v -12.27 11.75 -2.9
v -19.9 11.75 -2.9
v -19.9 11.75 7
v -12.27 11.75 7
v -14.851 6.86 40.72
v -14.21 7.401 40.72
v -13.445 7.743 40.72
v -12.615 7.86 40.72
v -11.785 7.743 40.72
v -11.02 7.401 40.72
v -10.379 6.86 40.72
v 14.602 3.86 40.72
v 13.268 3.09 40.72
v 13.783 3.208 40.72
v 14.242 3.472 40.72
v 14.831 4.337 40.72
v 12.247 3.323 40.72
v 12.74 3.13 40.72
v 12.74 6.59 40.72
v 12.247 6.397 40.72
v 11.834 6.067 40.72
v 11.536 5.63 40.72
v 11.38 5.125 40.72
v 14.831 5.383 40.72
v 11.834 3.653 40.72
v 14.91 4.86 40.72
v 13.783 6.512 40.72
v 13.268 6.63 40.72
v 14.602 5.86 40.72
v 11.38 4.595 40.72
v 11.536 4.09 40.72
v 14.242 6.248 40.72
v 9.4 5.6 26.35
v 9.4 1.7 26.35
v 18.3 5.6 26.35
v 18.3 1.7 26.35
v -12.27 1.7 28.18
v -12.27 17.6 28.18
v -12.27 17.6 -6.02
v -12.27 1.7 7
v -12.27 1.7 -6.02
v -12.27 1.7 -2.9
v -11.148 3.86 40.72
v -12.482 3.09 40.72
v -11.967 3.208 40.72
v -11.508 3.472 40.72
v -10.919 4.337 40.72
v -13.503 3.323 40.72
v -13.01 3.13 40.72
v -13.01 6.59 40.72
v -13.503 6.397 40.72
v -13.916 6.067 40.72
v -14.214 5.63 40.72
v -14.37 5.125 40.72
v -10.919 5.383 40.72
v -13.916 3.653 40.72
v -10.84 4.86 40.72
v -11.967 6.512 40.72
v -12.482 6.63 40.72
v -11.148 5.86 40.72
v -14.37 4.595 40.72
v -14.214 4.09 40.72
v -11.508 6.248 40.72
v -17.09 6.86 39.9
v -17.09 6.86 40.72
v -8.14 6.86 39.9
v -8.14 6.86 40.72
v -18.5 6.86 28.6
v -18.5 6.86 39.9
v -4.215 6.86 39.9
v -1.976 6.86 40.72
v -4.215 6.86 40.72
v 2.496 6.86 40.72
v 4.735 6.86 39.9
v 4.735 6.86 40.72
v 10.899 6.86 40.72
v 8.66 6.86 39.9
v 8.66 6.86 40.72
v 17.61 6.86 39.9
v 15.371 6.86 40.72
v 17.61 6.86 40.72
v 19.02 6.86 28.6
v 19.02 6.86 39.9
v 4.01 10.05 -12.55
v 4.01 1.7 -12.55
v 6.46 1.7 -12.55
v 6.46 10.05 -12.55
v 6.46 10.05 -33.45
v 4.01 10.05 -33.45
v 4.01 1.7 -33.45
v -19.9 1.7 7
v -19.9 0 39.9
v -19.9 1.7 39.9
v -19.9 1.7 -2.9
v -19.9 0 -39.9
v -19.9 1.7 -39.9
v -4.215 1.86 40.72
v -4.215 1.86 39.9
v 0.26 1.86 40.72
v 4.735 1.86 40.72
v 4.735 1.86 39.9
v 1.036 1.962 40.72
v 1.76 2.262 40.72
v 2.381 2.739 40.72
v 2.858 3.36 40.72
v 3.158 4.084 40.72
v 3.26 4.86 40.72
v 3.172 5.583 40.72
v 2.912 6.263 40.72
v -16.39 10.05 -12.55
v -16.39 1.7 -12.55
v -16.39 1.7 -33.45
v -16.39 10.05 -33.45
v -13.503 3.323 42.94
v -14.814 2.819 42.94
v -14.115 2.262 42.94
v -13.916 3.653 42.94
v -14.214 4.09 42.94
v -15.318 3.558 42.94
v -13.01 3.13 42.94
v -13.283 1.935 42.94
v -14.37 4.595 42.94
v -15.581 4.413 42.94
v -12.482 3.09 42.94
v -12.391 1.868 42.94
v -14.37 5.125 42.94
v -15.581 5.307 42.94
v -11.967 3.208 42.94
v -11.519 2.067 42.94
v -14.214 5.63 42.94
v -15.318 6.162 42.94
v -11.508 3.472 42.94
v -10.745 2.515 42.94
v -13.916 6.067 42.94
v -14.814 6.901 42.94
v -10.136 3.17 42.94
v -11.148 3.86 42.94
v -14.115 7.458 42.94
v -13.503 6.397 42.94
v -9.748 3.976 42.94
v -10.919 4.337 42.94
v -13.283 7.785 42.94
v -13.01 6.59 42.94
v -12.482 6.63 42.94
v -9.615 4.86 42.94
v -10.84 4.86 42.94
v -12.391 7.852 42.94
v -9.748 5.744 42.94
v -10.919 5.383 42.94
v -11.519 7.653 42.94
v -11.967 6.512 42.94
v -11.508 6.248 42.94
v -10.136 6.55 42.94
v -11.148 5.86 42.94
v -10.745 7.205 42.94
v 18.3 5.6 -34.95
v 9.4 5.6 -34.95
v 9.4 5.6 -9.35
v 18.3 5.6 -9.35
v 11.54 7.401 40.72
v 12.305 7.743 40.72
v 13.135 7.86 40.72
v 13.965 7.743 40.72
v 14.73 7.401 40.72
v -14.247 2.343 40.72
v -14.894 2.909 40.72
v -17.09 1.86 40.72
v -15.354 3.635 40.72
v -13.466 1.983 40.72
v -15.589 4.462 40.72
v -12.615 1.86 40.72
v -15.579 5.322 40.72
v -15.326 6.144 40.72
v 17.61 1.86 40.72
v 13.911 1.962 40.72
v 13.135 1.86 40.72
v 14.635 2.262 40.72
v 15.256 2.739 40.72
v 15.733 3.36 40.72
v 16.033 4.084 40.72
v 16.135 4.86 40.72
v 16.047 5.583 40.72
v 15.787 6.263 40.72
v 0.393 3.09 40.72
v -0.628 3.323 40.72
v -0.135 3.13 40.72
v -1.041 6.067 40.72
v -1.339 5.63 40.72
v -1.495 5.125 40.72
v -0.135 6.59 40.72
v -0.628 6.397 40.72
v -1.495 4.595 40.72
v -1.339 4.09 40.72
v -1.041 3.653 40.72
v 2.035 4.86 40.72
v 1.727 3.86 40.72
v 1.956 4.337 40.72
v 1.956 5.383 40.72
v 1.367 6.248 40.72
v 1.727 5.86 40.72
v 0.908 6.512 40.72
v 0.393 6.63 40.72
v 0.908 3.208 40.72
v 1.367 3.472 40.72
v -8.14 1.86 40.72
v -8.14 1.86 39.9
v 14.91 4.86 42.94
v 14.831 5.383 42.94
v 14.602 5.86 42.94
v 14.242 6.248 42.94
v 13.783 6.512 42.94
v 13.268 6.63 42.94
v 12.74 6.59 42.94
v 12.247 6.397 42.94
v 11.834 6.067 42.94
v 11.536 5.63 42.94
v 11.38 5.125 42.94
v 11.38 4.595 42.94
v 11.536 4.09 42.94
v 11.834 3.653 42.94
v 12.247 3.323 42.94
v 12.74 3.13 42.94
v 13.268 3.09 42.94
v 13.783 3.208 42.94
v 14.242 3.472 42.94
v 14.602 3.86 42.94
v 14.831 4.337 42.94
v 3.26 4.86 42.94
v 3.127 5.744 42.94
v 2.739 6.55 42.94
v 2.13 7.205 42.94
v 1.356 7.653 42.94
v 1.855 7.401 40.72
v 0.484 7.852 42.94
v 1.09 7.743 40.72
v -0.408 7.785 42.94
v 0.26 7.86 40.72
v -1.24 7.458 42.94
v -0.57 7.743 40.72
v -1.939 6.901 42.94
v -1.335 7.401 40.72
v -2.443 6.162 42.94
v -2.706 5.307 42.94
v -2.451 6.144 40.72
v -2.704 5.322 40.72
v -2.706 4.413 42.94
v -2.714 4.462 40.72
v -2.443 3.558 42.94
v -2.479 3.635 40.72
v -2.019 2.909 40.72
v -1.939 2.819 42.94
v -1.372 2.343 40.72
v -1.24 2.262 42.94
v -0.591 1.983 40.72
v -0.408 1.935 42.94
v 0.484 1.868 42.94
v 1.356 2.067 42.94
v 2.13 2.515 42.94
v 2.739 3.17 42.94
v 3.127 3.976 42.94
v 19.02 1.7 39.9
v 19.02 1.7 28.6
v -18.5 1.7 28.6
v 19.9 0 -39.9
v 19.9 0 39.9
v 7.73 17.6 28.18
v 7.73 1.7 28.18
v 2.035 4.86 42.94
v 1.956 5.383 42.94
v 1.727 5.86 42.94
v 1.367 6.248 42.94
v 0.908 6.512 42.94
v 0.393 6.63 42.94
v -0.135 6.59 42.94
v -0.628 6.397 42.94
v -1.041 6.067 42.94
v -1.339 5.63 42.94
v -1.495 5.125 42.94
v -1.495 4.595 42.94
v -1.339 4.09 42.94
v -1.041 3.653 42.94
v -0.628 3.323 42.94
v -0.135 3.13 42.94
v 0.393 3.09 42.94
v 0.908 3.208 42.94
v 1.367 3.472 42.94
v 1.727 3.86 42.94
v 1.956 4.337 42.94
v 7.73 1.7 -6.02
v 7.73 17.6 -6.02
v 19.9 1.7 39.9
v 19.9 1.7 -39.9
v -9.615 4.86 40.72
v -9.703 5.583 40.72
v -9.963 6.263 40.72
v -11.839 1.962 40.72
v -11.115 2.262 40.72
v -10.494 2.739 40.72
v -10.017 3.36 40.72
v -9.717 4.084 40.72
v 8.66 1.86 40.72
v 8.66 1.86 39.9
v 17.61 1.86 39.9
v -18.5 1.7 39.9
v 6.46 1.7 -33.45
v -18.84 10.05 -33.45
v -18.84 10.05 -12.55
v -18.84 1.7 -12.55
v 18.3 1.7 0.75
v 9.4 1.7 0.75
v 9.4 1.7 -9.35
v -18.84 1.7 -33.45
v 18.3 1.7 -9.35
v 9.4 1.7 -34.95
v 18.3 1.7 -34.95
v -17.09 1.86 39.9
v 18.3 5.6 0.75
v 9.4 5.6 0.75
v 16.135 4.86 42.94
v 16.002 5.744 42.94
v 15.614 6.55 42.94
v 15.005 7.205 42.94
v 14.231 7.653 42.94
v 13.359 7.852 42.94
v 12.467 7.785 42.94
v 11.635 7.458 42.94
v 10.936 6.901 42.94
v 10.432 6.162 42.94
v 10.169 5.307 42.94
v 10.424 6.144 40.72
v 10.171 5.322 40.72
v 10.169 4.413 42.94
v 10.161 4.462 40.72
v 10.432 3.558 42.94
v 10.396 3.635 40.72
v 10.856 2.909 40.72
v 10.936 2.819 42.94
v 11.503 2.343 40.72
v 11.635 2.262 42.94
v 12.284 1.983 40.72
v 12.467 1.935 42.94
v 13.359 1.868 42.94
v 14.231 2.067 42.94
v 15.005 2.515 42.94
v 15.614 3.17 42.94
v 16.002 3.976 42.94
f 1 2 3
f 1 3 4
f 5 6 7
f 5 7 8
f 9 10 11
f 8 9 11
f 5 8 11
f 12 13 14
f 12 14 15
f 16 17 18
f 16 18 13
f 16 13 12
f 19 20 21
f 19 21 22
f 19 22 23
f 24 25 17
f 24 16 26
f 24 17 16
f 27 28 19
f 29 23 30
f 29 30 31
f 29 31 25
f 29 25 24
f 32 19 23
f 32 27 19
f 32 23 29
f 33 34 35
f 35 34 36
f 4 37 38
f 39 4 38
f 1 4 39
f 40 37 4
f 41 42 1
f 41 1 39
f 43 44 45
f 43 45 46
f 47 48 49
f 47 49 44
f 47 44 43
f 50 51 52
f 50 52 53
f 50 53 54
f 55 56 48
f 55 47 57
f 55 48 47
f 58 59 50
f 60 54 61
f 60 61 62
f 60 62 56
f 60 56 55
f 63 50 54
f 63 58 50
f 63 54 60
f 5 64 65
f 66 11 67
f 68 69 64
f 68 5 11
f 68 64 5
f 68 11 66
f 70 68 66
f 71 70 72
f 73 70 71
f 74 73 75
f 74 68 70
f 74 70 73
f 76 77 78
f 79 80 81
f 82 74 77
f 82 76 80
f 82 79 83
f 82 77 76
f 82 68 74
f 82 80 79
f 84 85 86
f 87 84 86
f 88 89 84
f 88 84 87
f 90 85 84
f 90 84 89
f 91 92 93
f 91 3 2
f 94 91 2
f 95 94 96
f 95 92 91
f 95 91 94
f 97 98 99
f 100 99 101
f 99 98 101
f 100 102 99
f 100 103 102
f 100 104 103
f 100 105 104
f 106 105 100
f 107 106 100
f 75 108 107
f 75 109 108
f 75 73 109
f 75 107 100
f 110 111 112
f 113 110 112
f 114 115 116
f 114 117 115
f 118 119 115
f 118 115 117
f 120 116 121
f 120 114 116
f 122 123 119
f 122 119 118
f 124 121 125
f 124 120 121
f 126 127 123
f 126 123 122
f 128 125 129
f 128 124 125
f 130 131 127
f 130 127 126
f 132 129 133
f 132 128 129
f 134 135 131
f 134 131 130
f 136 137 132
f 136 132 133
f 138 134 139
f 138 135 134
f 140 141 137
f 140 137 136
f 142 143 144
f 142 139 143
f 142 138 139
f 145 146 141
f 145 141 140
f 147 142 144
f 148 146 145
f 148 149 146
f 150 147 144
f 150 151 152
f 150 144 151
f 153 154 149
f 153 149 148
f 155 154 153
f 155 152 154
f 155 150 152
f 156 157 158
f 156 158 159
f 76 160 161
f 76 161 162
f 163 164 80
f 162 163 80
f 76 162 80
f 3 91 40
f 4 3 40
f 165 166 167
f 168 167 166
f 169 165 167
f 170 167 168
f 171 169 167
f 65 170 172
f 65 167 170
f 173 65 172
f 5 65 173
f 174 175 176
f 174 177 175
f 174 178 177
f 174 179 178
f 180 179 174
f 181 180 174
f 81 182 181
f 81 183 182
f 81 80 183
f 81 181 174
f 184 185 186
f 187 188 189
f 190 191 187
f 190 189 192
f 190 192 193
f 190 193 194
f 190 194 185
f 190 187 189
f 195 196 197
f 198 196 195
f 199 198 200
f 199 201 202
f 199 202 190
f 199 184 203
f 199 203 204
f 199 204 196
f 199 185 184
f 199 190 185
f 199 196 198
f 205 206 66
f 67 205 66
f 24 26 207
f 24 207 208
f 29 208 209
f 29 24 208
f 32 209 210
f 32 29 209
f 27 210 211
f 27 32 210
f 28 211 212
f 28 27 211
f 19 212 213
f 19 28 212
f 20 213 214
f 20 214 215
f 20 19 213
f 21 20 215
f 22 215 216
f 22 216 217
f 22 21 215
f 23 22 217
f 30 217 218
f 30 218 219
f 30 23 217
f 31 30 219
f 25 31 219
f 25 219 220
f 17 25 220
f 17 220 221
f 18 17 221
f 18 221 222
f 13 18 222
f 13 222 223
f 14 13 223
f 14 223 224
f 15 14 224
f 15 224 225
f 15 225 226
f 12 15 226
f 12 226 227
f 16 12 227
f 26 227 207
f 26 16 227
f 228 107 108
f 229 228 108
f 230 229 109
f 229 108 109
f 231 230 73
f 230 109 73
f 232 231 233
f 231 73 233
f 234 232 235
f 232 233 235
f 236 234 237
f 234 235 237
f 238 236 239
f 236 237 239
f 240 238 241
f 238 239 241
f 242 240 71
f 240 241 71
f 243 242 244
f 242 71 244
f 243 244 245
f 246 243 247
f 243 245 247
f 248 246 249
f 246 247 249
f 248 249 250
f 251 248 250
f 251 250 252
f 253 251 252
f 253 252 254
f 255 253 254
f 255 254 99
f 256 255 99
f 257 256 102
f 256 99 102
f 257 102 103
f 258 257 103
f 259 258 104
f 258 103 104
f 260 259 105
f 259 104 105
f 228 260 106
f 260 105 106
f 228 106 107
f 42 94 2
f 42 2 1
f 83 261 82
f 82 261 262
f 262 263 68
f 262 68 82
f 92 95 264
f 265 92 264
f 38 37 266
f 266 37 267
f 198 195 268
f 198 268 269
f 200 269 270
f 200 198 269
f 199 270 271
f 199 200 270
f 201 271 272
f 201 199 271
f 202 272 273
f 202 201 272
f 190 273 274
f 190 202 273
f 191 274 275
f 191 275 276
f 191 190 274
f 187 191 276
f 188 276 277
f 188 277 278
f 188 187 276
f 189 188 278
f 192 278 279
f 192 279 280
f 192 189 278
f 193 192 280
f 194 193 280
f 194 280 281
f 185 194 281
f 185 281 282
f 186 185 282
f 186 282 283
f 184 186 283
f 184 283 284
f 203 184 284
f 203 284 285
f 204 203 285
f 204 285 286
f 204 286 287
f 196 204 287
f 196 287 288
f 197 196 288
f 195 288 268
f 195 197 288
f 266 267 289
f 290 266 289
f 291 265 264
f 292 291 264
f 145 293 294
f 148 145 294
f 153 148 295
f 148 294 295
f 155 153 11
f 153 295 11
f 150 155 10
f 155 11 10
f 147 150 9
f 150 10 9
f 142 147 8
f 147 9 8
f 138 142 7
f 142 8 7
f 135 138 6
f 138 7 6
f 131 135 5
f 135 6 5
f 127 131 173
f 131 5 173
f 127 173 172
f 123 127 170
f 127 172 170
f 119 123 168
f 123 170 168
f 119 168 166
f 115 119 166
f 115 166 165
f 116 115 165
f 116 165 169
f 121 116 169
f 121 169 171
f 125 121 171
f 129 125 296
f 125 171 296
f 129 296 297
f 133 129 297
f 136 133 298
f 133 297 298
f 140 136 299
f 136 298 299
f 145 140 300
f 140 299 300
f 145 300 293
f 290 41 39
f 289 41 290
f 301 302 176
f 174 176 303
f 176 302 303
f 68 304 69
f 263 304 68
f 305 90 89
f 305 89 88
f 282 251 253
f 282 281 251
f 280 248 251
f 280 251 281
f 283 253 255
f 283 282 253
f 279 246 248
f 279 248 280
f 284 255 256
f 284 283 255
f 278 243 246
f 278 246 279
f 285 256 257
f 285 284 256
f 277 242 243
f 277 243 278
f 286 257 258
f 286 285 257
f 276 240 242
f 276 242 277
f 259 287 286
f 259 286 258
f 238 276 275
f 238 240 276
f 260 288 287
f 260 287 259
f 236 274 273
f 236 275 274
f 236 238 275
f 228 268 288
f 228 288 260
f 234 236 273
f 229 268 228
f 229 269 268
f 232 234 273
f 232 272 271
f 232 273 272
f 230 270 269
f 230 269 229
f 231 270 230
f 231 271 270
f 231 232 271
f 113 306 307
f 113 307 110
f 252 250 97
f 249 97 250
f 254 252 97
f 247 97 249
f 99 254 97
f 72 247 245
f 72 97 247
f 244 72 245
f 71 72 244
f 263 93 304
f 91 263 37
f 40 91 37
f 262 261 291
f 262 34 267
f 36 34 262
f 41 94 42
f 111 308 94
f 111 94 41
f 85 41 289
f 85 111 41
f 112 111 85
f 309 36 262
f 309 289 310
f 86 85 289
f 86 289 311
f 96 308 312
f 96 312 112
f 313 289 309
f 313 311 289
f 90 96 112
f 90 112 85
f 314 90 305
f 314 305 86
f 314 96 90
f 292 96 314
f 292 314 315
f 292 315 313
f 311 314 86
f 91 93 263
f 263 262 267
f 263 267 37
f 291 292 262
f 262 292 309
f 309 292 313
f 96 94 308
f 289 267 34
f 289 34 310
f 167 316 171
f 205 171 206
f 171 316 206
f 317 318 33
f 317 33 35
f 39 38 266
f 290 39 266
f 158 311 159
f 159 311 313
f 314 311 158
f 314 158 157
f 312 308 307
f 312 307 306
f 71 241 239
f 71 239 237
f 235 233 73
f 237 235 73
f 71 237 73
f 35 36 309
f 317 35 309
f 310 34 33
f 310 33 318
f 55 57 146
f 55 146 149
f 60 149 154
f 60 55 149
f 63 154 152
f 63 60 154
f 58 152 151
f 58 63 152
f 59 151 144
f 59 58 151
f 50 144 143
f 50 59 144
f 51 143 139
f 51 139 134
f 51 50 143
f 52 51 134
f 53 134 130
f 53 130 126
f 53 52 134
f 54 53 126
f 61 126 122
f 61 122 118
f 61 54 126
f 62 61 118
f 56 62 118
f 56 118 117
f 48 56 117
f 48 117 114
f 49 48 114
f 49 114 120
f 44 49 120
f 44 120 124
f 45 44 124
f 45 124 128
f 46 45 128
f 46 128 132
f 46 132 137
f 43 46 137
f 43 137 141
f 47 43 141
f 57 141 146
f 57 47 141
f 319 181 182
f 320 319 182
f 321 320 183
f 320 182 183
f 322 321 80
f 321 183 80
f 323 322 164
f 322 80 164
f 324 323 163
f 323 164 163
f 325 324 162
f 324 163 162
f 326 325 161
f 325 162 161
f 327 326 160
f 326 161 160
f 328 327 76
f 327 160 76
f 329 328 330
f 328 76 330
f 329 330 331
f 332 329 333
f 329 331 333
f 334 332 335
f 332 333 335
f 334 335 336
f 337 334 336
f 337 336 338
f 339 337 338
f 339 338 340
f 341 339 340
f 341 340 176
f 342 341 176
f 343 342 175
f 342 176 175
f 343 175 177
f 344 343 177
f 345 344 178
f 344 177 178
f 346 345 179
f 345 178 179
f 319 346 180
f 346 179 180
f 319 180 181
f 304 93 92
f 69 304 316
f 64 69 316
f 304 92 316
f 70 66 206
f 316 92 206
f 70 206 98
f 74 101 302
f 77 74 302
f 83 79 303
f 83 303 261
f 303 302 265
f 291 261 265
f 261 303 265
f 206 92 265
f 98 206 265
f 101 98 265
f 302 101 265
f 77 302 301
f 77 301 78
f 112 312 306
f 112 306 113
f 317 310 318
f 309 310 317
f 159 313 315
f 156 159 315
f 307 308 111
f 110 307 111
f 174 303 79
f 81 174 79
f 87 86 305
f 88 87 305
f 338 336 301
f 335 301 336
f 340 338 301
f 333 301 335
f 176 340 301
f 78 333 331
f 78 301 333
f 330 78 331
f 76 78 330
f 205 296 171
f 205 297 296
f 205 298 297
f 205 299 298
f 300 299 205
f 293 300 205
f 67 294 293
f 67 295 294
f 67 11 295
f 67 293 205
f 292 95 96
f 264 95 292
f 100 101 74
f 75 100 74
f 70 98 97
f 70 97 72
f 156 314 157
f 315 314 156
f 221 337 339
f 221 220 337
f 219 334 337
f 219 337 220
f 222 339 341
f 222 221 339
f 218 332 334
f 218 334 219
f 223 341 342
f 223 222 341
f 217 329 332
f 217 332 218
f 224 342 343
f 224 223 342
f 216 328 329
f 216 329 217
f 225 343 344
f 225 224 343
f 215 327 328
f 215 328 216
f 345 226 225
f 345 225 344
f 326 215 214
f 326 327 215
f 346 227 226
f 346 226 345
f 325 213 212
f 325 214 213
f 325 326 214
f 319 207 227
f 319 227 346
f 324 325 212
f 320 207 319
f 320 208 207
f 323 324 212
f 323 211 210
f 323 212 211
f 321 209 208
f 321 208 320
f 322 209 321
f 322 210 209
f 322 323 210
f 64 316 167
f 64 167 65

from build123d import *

# Parameters (mm, degrees)
SKETCH1_W           = 39.8
SKETCH1_H           = 79.8
BOSS_EXTRUDE1_DEPTH = 1.7
SKETCH2_W           = 20
SKETCH2_H           = 34.2
BOSS_EXTRUDE2_DEPTH = 15.9
SKETCH3_W           = 2.45
SKETCH3_H           = 20.9
BOSS_EXTRUDE3_DEPTH = 8.35
SKETCH4_W           = 7.63
SKETCH4_H           = 9.9
BOSS_EXTRUDE4_DEPTH = 10.05
SKETCH5_W           = 8.9
SKETCH5_H           = 25.6
BOSS_EXTRUDE5_DEPTH = 3.9
SKETCH6_W           = 37.52
SKETCH6_H           = 11.3
BOSS_EXTRUDE6_DEPTH = 5.16
SKETCH7_W           = 8.95
SKETCH7_H           = 5
BOSS_EXTRUDE7_DEPTH = 0.82
SKETCH8_R           = 3
SKETCH8_R_2         = 1.775
BOSS_EXTRUDE8_DEPTH = 2.22
LPATTERN1_COUNT     = 2
LPATTERN1_PITCH     = 12.875
LPATTERN2_COUNT     = 2
LPATTERN2_PITCH     = 12.875


with BuildPart() as part:
    # Sketch1 → Boss-Extrude1 (new body)
    with BuildSketch(Plane(origin=(0, 0, 0), x_dir=(1, 0, 0), z_dir=(0, 1, 0))):
        Rectangle(SKETCH1_W, SKETCH1_H)
    extrude(amount=BOSS_EXTRUDE1_DEPTH)

    # Sketch2 → Boss-Extrude2 (add)
    with BuildSketch(Plane(origin=(0, 1.7, 0), x_dir=(1, 0, 0), z_dir=(0, 1, 0))):
        with Locations((-2.27, -11.08)):
            Rectangle(SKETCH2_W, SKETCH2_H)
    extrude(amount=BOSS_EXTRUDE2_DEPTH)

    # Sketch3 → Boss-Extrude3 (add)
    with BuildSketch(Plane(origin=(0, 1.7, 0), x_dir=(1, 0, 0), z_dir=(0, 1, 0))):
        with Locations((-17.615, 23)):
            Rectangle(SKETCH3_W, SKETCH3_H)
        with Locations((5.235, 23)):
            Rectangle(SKETCH3_W, SKETCH3_H)
    extrude(amount=BOSS_EXTRUDE3_DEPTH)

    # Sketch4 → Boss-Extrude4 (add)
    with BuildSketch(Plane(origin=(0, 1.7, 0), x_dir=(1, 0, 0), z_dir=(0, 1, 0))):
        with Locations((-16.085, -2.05)):
            Rectangle(SKETCH4_W, SKETCH4_H)
    extrude(amount=BOSS_EXTRUDE4_DEPTH)

    # Sketch5 → Boss-Extrude5 (add)
    with BuildSketch(Plane(origin=(0, 1.7, 0), x_dir=(1, 0, 0), z_dir=(0, 1, 0))):
        with Locations((13.85, -13.55)):
            Rectangle(SKETCH5_W, SKETCH5_H)
        with Locations((13.85, 22.15)):
            Rectangle(SKETCH5_W, SKETCH5_H)
    extrude(amount=BOSS_EXTRUDE5_DEPTH)

    # Sketch6 → Boss-Extrude6 (add)
    with BuildSketch(Plane(origin=(0, 1.7, 0), x_dir=(1, 0, 0), z_dir=(0, 1, 0))):
        with Locations((0.26, -34.25)):
            Rectangle(SKETCH6_W, SKETCH6_H)
    extrude(amount=BOSS_EXTRUDE6_DEPTH)

    # Sketch7 → Boss-Extrude7 (add)
    with BuildSketch(Plane.XY.offset(39.9)):
        with Locations((0.26, 4.36)):
            Rectangle(SKETCH7_W, SKETCH7_H)
    boss_extrude7 = extrude(amount=BOSS_EXTRUDE7_DEPTH)

    # Sketch8 → Boss-Extrude8 (add)
    with BuildSketch(Plane.XY.offset(40.72)):
        with Locations((0.26, 4.86)):
            Circle(SKETCH8_R)
        with Locations((0.26, 4.86)):
            Circle(SKETCH8_R_2, mode=Mode.SUBTRACT)
    boss_extrude8 = extrude(amount=BOSS_EXTRUDE8_DEPTH)

    # LPattern1: Boss-Extrude7, Boss-Extrude8 ×2
    with Locations(*[(-i * LPATTERN1_PITCH, 0, 0) for i in range(1, LPATTERN1_COUNT)]):
        add(boss_extrude7)
        add(boss_extrude8)

    # LPattern2: Boss-Extrude7, Boss-Extrude8 ×2
    with Locations(*[(i * LPATTERN2_PITCH, 0, 0) for i in range(1, LPATTERN2_COUNT)]):
        add(boss_extrude7)
        add(boss_extrude8)


solid = part.part
